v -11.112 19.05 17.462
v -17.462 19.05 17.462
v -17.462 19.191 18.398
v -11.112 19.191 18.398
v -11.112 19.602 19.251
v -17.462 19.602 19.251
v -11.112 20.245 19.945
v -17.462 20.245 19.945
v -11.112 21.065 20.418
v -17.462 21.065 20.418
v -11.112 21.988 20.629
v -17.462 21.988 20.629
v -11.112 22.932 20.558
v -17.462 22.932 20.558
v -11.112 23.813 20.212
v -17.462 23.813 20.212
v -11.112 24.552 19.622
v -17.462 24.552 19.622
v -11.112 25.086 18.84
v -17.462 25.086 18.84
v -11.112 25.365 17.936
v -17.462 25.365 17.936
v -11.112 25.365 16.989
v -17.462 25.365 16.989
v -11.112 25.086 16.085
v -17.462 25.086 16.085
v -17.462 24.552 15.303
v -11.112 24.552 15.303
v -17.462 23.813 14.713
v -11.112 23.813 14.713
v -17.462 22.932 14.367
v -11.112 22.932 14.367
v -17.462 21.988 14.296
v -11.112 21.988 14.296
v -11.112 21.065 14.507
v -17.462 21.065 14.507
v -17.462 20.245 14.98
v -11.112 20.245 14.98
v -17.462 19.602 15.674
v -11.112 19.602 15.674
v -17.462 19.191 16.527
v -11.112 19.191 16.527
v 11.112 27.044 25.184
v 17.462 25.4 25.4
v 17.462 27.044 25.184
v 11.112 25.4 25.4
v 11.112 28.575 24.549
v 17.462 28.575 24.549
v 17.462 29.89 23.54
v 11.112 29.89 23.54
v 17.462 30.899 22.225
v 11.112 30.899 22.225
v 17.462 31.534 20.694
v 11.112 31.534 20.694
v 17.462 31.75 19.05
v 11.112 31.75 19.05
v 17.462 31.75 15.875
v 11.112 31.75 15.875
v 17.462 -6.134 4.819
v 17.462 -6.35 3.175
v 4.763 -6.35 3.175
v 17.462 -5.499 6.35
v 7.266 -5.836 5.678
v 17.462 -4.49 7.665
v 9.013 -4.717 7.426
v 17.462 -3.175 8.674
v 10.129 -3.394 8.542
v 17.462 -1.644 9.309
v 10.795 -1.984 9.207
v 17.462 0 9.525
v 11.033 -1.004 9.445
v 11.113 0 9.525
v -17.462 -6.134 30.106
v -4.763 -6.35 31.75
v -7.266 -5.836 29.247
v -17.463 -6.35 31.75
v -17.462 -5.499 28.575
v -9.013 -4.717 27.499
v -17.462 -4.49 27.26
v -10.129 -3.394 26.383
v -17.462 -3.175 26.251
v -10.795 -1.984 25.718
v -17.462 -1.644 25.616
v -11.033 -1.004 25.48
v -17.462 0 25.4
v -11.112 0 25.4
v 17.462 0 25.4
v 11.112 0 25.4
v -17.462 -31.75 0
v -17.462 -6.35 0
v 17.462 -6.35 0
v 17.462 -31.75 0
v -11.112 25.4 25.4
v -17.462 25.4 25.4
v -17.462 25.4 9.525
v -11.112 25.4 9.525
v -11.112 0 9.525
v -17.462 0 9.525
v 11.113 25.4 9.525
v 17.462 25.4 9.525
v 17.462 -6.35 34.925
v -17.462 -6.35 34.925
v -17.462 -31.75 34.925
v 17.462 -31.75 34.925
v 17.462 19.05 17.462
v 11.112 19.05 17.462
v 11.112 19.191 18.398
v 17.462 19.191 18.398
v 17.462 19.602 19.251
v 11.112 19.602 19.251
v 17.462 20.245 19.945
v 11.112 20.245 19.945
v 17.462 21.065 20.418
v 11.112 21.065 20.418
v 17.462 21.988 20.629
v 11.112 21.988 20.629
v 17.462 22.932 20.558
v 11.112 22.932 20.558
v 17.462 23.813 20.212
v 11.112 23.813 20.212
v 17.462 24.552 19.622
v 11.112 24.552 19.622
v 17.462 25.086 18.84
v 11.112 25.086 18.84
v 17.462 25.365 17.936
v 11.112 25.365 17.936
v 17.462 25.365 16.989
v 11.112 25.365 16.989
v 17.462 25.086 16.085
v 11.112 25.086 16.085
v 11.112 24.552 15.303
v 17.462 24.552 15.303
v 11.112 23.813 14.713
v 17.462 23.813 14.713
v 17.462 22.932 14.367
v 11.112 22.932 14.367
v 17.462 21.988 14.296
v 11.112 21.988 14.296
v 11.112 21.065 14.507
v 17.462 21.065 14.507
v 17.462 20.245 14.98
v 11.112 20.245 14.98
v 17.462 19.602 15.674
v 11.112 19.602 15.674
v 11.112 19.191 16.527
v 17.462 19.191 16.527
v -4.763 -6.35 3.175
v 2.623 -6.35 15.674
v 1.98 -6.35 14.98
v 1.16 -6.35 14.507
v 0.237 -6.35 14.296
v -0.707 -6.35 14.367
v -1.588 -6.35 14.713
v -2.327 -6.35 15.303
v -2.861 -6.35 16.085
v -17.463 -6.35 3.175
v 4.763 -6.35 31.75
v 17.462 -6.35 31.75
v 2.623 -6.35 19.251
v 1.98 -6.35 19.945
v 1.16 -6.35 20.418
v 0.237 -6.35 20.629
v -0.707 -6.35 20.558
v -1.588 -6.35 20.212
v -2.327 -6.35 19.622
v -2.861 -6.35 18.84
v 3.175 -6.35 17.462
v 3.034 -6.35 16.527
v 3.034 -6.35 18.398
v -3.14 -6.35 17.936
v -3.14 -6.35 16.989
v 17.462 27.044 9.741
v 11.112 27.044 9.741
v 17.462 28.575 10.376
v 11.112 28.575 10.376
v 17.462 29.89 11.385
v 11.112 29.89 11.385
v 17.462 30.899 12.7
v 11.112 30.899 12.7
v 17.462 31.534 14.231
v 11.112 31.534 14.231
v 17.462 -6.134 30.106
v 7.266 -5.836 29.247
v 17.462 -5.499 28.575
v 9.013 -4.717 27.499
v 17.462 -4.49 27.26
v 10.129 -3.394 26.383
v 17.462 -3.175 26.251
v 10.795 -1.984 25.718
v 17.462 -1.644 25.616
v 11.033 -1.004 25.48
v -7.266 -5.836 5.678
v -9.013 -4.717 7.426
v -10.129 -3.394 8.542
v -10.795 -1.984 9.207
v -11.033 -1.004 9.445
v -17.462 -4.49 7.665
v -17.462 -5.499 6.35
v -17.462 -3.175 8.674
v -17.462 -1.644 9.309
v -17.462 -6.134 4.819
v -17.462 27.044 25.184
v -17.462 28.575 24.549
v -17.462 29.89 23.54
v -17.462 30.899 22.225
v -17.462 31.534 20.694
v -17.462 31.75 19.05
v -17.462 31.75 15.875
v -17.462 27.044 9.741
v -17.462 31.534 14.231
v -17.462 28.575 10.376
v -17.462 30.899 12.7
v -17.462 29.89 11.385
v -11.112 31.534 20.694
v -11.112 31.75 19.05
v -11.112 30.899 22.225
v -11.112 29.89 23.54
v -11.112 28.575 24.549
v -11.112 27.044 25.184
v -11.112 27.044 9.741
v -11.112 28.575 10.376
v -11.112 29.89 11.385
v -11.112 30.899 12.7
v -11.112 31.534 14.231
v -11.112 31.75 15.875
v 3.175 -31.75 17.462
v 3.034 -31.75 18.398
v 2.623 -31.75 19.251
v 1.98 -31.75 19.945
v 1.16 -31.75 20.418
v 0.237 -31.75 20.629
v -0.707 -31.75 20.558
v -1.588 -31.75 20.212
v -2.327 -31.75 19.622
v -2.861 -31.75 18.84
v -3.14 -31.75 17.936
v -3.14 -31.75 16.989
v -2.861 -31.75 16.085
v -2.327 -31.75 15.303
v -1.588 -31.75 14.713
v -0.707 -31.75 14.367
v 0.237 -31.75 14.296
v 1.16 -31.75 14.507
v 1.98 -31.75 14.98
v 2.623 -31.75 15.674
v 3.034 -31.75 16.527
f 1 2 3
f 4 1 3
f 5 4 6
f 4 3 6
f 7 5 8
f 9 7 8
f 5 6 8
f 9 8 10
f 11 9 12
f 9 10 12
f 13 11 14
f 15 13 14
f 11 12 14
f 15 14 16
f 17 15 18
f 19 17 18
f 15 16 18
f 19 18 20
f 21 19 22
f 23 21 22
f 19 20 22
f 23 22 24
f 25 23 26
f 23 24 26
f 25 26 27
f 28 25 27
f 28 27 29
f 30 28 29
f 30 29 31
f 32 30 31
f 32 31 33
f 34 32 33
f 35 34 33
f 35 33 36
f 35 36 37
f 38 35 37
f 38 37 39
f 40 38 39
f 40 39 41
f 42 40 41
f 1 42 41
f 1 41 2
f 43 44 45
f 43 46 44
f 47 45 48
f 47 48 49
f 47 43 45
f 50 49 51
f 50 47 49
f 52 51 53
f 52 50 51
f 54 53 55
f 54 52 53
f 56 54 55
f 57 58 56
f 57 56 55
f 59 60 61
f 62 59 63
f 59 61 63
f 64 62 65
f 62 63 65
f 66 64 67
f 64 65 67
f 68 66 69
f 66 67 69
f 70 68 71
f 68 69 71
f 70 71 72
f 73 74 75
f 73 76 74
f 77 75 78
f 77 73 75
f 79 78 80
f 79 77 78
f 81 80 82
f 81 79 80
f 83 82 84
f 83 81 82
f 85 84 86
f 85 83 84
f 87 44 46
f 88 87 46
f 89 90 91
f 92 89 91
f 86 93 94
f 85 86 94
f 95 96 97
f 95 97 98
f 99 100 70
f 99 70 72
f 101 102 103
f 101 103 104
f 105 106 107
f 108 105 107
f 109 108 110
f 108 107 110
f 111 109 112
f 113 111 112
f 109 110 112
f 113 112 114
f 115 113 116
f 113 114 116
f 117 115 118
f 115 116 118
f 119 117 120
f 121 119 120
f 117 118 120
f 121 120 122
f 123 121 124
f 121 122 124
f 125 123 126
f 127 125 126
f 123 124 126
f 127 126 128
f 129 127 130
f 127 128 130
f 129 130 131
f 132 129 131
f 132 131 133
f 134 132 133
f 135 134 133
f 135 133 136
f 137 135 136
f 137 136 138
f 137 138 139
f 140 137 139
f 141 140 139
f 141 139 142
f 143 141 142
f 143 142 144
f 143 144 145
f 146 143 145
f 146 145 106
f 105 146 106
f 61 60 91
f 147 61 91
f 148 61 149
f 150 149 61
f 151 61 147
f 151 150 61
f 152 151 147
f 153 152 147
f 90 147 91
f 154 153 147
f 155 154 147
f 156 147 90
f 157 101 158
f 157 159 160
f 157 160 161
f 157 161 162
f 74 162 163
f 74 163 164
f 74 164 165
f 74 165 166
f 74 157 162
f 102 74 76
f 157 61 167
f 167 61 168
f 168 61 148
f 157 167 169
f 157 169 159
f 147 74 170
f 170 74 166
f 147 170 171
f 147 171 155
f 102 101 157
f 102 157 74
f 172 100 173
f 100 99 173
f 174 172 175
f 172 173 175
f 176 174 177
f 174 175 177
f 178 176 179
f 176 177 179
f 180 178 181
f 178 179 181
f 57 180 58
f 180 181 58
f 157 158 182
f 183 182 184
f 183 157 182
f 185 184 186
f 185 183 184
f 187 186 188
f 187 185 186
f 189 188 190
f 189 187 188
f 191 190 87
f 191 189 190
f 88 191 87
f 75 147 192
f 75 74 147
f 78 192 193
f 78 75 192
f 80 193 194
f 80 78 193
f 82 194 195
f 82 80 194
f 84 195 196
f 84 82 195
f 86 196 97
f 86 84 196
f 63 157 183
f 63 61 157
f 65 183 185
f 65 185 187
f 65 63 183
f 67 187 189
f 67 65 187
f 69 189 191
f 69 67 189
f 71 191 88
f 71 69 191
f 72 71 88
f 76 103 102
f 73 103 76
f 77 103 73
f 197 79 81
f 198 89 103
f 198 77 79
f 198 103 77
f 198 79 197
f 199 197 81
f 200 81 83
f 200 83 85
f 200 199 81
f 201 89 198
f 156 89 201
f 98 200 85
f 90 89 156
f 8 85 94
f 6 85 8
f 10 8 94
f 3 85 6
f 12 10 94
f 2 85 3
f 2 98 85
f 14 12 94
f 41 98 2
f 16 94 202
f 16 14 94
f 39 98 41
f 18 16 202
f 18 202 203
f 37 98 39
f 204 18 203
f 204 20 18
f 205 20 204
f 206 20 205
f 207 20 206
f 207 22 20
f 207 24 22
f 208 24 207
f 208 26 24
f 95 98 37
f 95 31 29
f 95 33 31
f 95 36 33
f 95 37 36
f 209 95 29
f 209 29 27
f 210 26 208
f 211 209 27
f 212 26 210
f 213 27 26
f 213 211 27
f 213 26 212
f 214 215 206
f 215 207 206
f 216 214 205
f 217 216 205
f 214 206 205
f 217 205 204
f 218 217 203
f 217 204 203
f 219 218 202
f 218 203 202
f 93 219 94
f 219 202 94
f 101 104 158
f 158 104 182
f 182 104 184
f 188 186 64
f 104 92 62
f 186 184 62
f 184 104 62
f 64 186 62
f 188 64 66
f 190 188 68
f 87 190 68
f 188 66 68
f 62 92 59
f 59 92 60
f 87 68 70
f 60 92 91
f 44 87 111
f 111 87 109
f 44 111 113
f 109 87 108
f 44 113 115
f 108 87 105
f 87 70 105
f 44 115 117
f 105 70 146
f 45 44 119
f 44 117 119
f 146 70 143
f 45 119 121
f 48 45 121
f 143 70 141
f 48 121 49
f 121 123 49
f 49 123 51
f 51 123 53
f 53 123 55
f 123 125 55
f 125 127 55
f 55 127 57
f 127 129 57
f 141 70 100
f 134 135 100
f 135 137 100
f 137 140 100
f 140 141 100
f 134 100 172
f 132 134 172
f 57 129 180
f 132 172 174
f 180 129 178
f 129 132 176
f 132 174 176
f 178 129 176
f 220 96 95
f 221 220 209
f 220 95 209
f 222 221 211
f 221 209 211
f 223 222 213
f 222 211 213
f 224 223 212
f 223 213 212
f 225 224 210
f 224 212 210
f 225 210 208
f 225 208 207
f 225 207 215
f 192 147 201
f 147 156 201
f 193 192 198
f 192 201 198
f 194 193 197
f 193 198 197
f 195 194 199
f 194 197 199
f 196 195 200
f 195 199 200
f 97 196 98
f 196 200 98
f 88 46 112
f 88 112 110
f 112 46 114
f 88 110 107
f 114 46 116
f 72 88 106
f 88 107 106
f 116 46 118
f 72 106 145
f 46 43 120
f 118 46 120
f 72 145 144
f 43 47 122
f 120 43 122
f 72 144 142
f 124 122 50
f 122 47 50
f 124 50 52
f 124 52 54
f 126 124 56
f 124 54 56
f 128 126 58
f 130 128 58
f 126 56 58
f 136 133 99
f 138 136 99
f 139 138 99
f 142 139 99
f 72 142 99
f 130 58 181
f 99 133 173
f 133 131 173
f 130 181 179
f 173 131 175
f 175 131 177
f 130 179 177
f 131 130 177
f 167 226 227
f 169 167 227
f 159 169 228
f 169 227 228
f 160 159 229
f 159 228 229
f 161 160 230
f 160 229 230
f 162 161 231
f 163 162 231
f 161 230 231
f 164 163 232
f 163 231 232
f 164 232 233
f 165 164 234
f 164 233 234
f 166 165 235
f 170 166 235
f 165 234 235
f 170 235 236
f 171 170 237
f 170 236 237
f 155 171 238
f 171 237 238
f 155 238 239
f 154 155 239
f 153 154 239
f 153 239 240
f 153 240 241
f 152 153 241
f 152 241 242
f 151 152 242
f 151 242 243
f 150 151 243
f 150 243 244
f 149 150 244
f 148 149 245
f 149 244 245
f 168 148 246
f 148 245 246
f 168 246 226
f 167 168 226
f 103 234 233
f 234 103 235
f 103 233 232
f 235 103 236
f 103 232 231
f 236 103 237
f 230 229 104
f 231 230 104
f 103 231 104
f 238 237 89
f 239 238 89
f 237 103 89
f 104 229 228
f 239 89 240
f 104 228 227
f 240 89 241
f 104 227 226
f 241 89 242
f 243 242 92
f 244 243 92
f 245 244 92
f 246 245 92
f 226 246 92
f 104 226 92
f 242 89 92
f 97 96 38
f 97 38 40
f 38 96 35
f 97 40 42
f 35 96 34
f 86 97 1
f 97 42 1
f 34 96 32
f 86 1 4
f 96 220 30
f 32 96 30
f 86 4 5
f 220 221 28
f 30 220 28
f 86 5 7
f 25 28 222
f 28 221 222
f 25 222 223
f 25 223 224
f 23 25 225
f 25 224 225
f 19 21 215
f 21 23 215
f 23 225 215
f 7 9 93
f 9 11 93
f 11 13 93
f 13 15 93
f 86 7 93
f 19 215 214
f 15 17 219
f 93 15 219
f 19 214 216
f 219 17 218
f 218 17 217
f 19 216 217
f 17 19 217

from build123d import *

# Parameters (mm, degrees)
F0_W     = 34.925
F0_H     = 63.5
F1_DEPTH = 34.925
F2_W     = 6.35
F2_H     = 9.525
F3_DEPTH = 38.1
F4_R     = 3.175
F5_DEPTH = 34.926
F6_R     = 3.175
F7_DEPTH = 25.4
F8_R     = 6.35


with BuildPart() as f1:
    # F0 (on Top) → F1 (new body)
    with BuildSketch(Plane.XY):
        Rectangle(F0_W, F0_H)
    extrude(amount=F1_DEPTH)

    # F2 (on face) → F3 (cut)
    with BuildSketch(Plane(origin=(0, 31.75, 0), x_dir=(-1, 0, 0), z_dir=(0, 1, 0))):
        with Locations((-14.2875, 30.1625)):
            Rectangle(F2_W, F2_H)
        with Locations((-14.2875, 4.7625)):
            Rectangle(F2_W, F2_H)
        with Locations((14.2875, 30.1625)):
            Rectangle(F2_W, F2_H)
        with Locations((14.2875, 4.7625)):
            Rectangle(F2_W, F2_H)
        Polygon((11.1125, 34.925), (-11.1125, 34.925), (-11.1125, 25.4), (-11.1125, 9.525), (-11.1125, 0), (11.1125, 0), (11.1125, 9.525), (11.1125, 25.4), align=None)
    extrude(amount=-F3_DEPTH, mode=Mode.SUBTRACT)

    # F4 (on face) → F5 (cut, through all)
    with BuildSketch(Plane(origin=(-17.4625, 0, 0), x_dir=(0, -1, 0), z_dir=(-1, 0, 0))):
        with Locations((-22.225, 17.4625)):
            Circle(F4_R)
    extrude(amount=-F5_DEPTH, mode=Mode.SUBTRACT)

    # F6 (on face) → F7 (cut)
    with BuildSketch(Plane.XZ.offset(31.75)):
        with Locations((0, 17.4625)):
            Circle(F6_R)
    extrude(amount=-F7_DEPTH, mode=Mode.SUBTRACT)

    # F8
    f8_edges = [f1.edges().sort_by_distance(p)[0] for p in [
        (14.2875, 31.75, 25.4),
        (14.2875, -6.35, 25.4),
        (-14.2875, -6.35, 25.4),
        (-14.2875, 31.75, 25.4),
        (-14.2875, 31.75, 9.525),
        (14.2875, 31.75, 9.525),
        (14.2875, -6.35, 9.525),
        (-14.2875, -6.35, 9.525),
        (11.1125, -6.35, 17.4625),
        (-11.1125, -6.35, 17.4625),
    ]]
    fillet(f8_edges, radius=F8_R)


solid = f1.part
